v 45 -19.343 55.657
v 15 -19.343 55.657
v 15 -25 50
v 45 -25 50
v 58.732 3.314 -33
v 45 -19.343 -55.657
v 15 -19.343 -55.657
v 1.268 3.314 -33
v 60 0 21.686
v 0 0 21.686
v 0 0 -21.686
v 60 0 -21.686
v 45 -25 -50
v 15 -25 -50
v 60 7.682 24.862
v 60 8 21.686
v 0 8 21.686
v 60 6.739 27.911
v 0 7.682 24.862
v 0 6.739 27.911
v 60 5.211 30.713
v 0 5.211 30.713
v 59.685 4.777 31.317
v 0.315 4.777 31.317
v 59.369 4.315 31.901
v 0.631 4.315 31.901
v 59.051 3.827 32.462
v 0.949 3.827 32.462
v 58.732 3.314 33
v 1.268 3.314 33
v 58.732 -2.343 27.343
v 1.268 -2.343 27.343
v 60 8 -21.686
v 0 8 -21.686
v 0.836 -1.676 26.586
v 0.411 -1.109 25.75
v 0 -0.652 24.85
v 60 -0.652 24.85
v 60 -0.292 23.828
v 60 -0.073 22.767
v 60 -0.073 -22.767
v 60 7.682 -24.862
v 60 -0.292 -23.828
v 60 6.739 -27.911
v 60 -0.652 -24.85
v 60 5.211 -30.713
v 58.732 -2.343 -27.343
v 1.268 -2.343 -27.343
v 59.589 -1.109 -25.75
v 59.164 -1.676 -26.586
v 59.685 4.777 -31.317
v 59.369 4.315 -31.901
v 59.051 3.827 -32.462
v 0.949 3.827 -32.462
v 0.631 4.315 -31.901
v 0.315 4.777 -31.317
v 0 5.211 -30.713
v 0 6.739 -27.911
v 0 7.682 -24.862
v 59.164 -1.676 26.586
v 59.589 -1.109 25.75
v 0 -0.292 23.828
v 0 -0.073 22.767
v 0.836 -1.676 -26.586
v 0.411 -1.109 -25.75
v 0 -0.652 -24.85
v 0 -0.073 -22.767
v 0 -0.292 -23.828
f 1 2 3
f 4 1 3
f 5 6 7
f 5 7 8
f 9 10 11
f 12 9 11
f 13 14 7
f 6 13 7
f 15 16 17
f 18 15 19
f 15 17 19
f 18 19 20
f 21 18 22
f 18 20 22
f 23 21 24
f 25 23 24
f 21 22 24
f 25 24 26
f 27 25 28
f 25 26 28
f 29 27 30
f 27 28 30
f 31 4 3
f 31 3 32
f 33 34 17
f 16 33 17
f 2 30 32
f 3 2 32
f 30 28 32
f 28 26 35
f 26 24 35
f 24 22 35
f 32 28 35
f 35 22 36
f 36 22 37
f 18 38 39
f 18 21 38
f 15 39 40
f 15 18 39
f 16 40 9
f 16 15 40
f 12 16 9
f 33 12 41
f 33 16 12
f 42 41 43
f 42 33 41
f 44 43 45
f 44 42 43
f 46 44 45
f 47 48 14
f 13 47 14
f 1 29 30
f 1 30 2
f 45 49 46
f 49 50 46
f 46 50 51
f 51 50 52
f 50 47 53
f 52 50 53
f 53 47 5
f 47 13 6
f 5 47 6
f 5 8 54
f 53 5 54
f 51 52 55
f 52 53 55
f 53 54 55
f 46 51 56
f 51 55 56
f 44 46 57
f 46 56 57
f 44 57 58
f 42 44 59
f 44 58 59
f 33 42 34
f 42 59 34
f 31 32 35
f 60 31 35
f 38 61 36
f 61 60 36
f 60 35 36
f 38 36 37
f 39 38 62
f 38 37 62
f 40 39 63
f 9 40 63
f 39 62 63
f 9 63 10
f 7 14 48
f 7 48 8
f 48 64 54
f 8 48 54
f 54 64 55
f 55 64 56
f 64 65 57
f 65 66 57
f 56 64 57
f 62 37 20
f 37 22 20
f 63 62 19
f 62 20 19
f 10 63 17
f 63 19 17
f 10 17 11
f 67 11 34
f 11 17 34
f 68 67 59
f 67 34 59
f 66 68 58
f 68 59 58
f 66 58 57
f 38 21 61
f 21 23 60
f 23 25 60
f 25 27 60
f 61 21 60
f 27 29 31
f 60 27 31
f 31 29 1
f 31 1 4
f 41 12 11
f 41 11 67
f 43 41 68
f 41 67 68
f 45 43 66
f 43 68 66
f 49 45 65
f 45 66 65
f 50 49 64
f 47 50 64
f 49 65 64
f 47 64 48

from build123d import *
from OCP.BRepFilletAPI import BRepFilletAPI_MakeChamfer

# Parameters (mm, degrees)
SM_BASE_FLANGE_1_DEPTH = 60
CHAMFER_2_SIZE         = 35
CHAMFER_2_SIZE2        = 15
CHAMFER_3_SIZE         = 15
CHAMFER_3_SIZE2        = 35


# Sheet-metal steps are written as plain solids
with BuildPart() as part:
    # Sketch 1 → 基体-法兰1 (new body)
    with BuildSketch(Plane(origin=(0, 0, 0), x_dir=(0, 0, -1), z_dir=(1, 0, 0))):
        with BuildLine():
            Line((-50, -25), (-27.343145751, -2.343145751))
            ThreePointArc((-27.343145751, -2.343145751), (-24.74775896, -0.60896374), (-21.686291501, 0))
            Line((-21.686291501, 0), (21.686291501, 0))
            ThreePointArc((21.686291501, 0), (24.74775896, -0.60896374), (27.343145751, -2.343145751))
            Line((27.343145751, -2.343145751), (50, -25))
            Line((50, -25), (55.656854249, -19.343145751))
            Line((55.656854249, -19.343145751), (33, 3.313708499))
            ThreePointArc((33, 3.313708499), (27.809226419, 6.78207252), (21.686291501, 8))
            Line((21.686291501, 8), (-21.686291501, 8))
            ThreePointArc((-21.686291501, 8), (-27.809226419, 6.78207252), (-33, 3.313708499))
            Line((-33, 3.313708499), (-55.656854249, -19.343145751))
            Line((-55.656854249, -19.343145751), (-50, -25))
        make_face()
    extrude(amount=SM_BASE_FLANGE_1_DEPTH)

    # 倒角2
    chamfer_2_edges = [part.edges().sort_by_distance(p)[0] for p in [
        (60, -22.171572875, 52.828427125),
        (60, -22.171572875, -52.828427125),
    ]]
    chamfer_2_side = [part.faces().sort_by_distance(p)[0] for p in [
        (60, -8.83568579, 43.50745996),
    ]]
    chamfer(chamfer_2_edges, length=CHAMFER_2_SIZE, length2=CHAMFER_2_SIZE2, reference=chamfer_2_side[0])

    # 倒角3: one chamfer whose edges measure the first distance from different faces: ONE call of the kernel's chamfer builder (chamfer() names one face for all edges)
    chamfer_3_edges_1 = [part.edges().sort_by_distance(p)[0] for p in [
        (0, -22.171572875, 52.828427125),
    ]]
    chamfer_3_side_1 = [part.faces().sort_by_distance(p)[0] for p in [
        (22.5, -22.171572875, 52.828427125),
    ]]
    chamfer_3_edges_2 = [part.edges().sort_by_distance(p)[0] for p in [
        (0, -22.171572875, -52.828427125),
    ]]
    chamfer_3_side_2 = [part.faces().sort_by_distance(p)[0] for p in [
        (22.5, -22.171572875, -52.828427125),
    ]]
    chamfer_3 = BRepFilletAPI_MakeChamfer(part.part.solid().wrapped)
    for e in chamfer_3_edges_1:
        chamfer_3.Add(CHAMFER_3_SIZE, CHAMFER_3_SIZE2, e.wrapped, chamfer_3_side_1[0].wrapped)  # the first distance lies on this face
    for e in chamfer_3_edges_2:
        chamfer_3.Add(CHAMFER_3_SIZE, CHAMFER_3_SIZE2, e.wrapped, chamfer_3_side_2[0].wrapped)  # the first distance lies on this face
    add(Compound.cast(chamfer_3.Shape()), mode=Mode.REPLACE)


solid = part.part
